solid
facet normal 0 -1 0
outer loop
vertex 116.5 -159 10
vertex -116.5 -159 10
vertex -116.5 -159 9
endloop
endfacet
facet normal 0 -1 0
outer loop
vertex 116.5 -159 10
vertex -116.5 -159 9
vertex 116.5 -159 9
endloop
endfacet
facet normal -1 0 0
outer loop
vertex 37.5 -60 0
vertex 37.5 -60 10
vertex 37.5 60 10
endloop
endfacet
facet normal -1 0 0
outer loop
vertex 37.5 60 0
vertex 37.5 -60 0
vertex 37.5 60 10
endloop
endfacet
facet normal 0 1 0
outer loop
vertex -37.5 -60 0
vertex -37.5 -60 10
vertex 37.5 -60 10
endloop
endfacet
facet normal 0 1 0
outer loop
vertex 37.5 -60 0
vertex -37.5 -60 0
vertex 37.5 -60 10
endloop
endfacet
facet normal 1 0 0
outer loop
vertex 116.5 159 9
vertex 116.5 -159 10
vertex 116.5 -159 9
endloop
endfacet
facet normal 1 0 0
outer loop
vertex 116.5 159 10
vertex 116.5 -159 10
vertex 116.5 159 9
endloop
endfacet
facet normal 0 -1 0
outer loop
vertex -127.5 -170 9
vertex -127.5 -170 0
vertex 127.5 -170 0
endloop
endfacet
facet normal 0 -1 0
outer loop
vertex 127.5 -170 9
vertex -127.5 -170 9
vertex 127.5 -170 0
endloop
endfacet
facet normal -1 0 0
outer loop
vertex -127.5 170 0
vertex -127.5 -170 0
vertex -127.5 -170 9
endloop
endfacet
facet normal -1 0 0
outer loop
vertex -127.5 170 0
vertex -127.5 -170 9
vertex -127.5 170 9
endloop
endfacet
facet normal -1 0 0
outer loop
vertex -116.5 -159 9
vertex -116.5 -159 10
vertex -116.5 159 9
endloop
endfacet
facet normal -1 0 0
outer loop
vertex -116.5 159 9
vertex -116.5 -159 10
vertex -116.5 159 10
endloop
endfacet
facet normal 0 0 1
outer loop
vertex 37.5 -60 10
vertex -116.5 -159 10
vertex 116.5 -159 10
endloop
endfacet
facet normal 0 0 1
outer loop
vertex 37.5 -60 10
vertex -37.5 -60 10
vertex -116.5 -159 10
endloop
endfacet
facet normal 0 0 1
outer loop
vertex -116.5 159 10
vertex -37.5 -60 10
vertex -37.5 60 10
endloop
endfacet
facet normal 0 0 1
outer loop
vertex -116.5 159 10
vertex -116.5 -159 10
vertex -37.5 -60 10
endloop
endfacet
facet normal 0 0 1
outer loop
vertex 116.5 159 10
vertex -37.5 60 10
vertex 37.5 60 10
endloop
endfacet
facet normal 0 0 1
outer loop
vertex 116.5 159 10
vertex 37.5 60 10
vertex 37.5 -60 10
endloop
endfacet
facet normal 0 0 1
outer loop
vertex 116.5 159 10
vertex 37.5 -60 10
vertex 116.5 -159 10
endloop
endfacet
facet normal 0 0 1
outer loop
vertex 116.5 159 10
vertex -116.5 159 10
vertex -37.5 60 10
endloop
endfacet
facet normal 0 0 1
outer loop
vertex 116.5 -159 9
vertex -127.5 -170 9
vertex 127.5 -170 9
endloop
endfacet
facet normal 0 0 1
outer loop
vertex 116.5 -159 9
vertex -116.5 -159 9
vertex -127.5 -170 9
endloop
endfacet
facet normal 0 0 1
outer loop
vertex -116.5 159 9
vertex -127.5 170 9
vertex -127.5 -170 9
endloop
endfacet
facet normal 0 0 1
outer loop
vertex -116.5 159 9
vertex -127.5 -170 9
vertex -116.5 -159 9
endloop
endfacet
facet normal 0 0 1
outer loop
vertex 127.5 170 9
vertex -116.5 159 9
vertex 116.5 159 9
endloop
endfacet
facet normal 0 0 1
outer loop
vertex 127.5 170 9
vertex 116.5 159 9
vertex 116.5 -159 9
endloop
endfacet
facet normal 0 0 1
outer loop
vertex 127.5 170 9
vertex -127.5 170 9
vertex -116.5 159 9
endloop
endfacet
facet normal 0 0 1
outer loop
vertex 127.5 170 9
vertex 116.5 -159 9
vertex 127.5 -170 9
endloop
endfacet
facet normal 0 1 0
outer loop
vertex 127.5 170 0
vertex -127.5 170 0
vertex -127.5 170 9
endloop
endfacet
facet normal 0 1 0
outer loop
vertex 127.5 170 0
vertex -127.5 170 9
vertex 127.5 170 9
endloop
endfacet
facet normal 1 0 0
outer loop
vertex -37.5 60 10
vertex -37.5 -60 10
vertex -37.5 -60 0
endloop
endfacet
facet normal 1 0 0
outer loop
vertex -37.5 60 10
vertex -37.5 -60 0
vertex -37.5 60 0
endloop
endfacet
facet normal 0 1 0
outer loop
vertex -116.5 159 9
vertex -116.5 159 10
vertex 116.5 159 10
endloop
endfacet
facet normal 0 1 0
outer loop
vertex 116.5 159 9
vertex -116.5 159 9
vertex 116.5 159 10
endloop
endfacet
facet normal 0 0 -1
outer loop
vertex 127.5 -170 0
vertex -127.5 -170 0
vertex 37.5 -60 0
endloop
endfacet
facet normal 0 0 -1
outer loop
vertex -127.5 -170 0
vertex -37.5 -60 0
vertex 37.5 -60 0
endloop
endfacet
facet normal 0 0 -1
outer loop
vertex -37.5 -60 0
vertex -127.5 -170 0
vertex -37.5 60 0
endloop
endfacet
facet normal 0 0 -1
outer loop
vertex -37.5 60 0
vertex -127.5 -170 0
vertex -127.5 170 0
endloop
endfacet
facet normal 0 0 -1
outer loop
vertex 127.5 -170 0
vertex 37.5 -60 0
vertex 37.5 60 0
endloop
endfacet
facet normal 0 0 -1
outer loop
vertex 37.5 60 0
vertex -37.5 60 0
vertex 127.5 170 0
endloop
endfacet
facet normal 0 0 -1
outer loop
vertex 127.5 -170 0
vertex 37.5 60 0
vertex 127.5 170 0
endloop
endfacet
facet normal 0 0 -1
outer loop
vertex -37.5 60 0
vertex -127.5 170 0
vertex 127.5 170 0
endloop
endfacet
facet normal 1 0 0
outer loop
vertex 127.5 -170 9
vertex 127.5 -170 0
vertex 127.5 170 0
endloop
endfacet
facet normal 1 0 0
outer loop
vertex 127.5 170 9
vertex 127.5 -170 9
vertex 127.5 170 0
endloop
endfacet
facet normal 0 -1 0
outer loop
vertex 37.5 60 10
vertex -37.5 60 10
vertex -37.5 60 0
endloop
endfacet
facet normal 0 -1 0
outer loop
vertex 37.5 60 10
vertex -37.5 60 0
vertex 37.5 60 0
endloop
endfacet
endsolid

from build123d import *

# Parameters (mm, degrees)
ESQUISSE1_W             = 255
ESQUISSE1_H             = 340
BOSS_EXTRU_1_DEPTH      = 10
ESQUISSE2_W             = 255
ESQUISSE2_H             = 340
ESQUISSE2_W_2           = 233
ESQUISSE2_H_2           = 318
ENL_V_MAT_EXTRU_1_DEPTH = 1
SKETCH1_W               = 75
SKETCH1_H               = 120
CUT_EXTRUDE1_DEPTH      = 20


with BuildPart() as part:
    # Esquisse1 → Boss.-Extru.1 (new body)
    with BuildSketch(Plane.XY):
        Rectangle(ESQUISSE1_W, ESQUISSE1_H)
    extrude(amount=BOSS_EXTRU_1_DEPTH)

    # Esquisse2 → Enlèv. mat.-Extru.1 (cut)
    with BuildSketch(Plane.XY.offset(10)):
        Rectangle(ESQUISSE2_W, ESQUISSE2_H)
        Rectangle(ESQUISSE2_W_2, ESQUISSE2_H_2, mode=Mode.SUBTRACT)
    extrude(amount=-ENL_V_MAT_EXTRU_1_DEPTH, mode=Mode.SUBTRACT)

    # Sketch1 → Cut-Extrude1 (cut)
    with BuildSketch(Plane.XY.offset(10)):
        Rectangle(SKETCH1_W, SKETCH1_H)
    extrude(amount=-CUT_EXTRUDE1_DEPTH, mode=Mode.SUBTRACT)


solid = part.part
